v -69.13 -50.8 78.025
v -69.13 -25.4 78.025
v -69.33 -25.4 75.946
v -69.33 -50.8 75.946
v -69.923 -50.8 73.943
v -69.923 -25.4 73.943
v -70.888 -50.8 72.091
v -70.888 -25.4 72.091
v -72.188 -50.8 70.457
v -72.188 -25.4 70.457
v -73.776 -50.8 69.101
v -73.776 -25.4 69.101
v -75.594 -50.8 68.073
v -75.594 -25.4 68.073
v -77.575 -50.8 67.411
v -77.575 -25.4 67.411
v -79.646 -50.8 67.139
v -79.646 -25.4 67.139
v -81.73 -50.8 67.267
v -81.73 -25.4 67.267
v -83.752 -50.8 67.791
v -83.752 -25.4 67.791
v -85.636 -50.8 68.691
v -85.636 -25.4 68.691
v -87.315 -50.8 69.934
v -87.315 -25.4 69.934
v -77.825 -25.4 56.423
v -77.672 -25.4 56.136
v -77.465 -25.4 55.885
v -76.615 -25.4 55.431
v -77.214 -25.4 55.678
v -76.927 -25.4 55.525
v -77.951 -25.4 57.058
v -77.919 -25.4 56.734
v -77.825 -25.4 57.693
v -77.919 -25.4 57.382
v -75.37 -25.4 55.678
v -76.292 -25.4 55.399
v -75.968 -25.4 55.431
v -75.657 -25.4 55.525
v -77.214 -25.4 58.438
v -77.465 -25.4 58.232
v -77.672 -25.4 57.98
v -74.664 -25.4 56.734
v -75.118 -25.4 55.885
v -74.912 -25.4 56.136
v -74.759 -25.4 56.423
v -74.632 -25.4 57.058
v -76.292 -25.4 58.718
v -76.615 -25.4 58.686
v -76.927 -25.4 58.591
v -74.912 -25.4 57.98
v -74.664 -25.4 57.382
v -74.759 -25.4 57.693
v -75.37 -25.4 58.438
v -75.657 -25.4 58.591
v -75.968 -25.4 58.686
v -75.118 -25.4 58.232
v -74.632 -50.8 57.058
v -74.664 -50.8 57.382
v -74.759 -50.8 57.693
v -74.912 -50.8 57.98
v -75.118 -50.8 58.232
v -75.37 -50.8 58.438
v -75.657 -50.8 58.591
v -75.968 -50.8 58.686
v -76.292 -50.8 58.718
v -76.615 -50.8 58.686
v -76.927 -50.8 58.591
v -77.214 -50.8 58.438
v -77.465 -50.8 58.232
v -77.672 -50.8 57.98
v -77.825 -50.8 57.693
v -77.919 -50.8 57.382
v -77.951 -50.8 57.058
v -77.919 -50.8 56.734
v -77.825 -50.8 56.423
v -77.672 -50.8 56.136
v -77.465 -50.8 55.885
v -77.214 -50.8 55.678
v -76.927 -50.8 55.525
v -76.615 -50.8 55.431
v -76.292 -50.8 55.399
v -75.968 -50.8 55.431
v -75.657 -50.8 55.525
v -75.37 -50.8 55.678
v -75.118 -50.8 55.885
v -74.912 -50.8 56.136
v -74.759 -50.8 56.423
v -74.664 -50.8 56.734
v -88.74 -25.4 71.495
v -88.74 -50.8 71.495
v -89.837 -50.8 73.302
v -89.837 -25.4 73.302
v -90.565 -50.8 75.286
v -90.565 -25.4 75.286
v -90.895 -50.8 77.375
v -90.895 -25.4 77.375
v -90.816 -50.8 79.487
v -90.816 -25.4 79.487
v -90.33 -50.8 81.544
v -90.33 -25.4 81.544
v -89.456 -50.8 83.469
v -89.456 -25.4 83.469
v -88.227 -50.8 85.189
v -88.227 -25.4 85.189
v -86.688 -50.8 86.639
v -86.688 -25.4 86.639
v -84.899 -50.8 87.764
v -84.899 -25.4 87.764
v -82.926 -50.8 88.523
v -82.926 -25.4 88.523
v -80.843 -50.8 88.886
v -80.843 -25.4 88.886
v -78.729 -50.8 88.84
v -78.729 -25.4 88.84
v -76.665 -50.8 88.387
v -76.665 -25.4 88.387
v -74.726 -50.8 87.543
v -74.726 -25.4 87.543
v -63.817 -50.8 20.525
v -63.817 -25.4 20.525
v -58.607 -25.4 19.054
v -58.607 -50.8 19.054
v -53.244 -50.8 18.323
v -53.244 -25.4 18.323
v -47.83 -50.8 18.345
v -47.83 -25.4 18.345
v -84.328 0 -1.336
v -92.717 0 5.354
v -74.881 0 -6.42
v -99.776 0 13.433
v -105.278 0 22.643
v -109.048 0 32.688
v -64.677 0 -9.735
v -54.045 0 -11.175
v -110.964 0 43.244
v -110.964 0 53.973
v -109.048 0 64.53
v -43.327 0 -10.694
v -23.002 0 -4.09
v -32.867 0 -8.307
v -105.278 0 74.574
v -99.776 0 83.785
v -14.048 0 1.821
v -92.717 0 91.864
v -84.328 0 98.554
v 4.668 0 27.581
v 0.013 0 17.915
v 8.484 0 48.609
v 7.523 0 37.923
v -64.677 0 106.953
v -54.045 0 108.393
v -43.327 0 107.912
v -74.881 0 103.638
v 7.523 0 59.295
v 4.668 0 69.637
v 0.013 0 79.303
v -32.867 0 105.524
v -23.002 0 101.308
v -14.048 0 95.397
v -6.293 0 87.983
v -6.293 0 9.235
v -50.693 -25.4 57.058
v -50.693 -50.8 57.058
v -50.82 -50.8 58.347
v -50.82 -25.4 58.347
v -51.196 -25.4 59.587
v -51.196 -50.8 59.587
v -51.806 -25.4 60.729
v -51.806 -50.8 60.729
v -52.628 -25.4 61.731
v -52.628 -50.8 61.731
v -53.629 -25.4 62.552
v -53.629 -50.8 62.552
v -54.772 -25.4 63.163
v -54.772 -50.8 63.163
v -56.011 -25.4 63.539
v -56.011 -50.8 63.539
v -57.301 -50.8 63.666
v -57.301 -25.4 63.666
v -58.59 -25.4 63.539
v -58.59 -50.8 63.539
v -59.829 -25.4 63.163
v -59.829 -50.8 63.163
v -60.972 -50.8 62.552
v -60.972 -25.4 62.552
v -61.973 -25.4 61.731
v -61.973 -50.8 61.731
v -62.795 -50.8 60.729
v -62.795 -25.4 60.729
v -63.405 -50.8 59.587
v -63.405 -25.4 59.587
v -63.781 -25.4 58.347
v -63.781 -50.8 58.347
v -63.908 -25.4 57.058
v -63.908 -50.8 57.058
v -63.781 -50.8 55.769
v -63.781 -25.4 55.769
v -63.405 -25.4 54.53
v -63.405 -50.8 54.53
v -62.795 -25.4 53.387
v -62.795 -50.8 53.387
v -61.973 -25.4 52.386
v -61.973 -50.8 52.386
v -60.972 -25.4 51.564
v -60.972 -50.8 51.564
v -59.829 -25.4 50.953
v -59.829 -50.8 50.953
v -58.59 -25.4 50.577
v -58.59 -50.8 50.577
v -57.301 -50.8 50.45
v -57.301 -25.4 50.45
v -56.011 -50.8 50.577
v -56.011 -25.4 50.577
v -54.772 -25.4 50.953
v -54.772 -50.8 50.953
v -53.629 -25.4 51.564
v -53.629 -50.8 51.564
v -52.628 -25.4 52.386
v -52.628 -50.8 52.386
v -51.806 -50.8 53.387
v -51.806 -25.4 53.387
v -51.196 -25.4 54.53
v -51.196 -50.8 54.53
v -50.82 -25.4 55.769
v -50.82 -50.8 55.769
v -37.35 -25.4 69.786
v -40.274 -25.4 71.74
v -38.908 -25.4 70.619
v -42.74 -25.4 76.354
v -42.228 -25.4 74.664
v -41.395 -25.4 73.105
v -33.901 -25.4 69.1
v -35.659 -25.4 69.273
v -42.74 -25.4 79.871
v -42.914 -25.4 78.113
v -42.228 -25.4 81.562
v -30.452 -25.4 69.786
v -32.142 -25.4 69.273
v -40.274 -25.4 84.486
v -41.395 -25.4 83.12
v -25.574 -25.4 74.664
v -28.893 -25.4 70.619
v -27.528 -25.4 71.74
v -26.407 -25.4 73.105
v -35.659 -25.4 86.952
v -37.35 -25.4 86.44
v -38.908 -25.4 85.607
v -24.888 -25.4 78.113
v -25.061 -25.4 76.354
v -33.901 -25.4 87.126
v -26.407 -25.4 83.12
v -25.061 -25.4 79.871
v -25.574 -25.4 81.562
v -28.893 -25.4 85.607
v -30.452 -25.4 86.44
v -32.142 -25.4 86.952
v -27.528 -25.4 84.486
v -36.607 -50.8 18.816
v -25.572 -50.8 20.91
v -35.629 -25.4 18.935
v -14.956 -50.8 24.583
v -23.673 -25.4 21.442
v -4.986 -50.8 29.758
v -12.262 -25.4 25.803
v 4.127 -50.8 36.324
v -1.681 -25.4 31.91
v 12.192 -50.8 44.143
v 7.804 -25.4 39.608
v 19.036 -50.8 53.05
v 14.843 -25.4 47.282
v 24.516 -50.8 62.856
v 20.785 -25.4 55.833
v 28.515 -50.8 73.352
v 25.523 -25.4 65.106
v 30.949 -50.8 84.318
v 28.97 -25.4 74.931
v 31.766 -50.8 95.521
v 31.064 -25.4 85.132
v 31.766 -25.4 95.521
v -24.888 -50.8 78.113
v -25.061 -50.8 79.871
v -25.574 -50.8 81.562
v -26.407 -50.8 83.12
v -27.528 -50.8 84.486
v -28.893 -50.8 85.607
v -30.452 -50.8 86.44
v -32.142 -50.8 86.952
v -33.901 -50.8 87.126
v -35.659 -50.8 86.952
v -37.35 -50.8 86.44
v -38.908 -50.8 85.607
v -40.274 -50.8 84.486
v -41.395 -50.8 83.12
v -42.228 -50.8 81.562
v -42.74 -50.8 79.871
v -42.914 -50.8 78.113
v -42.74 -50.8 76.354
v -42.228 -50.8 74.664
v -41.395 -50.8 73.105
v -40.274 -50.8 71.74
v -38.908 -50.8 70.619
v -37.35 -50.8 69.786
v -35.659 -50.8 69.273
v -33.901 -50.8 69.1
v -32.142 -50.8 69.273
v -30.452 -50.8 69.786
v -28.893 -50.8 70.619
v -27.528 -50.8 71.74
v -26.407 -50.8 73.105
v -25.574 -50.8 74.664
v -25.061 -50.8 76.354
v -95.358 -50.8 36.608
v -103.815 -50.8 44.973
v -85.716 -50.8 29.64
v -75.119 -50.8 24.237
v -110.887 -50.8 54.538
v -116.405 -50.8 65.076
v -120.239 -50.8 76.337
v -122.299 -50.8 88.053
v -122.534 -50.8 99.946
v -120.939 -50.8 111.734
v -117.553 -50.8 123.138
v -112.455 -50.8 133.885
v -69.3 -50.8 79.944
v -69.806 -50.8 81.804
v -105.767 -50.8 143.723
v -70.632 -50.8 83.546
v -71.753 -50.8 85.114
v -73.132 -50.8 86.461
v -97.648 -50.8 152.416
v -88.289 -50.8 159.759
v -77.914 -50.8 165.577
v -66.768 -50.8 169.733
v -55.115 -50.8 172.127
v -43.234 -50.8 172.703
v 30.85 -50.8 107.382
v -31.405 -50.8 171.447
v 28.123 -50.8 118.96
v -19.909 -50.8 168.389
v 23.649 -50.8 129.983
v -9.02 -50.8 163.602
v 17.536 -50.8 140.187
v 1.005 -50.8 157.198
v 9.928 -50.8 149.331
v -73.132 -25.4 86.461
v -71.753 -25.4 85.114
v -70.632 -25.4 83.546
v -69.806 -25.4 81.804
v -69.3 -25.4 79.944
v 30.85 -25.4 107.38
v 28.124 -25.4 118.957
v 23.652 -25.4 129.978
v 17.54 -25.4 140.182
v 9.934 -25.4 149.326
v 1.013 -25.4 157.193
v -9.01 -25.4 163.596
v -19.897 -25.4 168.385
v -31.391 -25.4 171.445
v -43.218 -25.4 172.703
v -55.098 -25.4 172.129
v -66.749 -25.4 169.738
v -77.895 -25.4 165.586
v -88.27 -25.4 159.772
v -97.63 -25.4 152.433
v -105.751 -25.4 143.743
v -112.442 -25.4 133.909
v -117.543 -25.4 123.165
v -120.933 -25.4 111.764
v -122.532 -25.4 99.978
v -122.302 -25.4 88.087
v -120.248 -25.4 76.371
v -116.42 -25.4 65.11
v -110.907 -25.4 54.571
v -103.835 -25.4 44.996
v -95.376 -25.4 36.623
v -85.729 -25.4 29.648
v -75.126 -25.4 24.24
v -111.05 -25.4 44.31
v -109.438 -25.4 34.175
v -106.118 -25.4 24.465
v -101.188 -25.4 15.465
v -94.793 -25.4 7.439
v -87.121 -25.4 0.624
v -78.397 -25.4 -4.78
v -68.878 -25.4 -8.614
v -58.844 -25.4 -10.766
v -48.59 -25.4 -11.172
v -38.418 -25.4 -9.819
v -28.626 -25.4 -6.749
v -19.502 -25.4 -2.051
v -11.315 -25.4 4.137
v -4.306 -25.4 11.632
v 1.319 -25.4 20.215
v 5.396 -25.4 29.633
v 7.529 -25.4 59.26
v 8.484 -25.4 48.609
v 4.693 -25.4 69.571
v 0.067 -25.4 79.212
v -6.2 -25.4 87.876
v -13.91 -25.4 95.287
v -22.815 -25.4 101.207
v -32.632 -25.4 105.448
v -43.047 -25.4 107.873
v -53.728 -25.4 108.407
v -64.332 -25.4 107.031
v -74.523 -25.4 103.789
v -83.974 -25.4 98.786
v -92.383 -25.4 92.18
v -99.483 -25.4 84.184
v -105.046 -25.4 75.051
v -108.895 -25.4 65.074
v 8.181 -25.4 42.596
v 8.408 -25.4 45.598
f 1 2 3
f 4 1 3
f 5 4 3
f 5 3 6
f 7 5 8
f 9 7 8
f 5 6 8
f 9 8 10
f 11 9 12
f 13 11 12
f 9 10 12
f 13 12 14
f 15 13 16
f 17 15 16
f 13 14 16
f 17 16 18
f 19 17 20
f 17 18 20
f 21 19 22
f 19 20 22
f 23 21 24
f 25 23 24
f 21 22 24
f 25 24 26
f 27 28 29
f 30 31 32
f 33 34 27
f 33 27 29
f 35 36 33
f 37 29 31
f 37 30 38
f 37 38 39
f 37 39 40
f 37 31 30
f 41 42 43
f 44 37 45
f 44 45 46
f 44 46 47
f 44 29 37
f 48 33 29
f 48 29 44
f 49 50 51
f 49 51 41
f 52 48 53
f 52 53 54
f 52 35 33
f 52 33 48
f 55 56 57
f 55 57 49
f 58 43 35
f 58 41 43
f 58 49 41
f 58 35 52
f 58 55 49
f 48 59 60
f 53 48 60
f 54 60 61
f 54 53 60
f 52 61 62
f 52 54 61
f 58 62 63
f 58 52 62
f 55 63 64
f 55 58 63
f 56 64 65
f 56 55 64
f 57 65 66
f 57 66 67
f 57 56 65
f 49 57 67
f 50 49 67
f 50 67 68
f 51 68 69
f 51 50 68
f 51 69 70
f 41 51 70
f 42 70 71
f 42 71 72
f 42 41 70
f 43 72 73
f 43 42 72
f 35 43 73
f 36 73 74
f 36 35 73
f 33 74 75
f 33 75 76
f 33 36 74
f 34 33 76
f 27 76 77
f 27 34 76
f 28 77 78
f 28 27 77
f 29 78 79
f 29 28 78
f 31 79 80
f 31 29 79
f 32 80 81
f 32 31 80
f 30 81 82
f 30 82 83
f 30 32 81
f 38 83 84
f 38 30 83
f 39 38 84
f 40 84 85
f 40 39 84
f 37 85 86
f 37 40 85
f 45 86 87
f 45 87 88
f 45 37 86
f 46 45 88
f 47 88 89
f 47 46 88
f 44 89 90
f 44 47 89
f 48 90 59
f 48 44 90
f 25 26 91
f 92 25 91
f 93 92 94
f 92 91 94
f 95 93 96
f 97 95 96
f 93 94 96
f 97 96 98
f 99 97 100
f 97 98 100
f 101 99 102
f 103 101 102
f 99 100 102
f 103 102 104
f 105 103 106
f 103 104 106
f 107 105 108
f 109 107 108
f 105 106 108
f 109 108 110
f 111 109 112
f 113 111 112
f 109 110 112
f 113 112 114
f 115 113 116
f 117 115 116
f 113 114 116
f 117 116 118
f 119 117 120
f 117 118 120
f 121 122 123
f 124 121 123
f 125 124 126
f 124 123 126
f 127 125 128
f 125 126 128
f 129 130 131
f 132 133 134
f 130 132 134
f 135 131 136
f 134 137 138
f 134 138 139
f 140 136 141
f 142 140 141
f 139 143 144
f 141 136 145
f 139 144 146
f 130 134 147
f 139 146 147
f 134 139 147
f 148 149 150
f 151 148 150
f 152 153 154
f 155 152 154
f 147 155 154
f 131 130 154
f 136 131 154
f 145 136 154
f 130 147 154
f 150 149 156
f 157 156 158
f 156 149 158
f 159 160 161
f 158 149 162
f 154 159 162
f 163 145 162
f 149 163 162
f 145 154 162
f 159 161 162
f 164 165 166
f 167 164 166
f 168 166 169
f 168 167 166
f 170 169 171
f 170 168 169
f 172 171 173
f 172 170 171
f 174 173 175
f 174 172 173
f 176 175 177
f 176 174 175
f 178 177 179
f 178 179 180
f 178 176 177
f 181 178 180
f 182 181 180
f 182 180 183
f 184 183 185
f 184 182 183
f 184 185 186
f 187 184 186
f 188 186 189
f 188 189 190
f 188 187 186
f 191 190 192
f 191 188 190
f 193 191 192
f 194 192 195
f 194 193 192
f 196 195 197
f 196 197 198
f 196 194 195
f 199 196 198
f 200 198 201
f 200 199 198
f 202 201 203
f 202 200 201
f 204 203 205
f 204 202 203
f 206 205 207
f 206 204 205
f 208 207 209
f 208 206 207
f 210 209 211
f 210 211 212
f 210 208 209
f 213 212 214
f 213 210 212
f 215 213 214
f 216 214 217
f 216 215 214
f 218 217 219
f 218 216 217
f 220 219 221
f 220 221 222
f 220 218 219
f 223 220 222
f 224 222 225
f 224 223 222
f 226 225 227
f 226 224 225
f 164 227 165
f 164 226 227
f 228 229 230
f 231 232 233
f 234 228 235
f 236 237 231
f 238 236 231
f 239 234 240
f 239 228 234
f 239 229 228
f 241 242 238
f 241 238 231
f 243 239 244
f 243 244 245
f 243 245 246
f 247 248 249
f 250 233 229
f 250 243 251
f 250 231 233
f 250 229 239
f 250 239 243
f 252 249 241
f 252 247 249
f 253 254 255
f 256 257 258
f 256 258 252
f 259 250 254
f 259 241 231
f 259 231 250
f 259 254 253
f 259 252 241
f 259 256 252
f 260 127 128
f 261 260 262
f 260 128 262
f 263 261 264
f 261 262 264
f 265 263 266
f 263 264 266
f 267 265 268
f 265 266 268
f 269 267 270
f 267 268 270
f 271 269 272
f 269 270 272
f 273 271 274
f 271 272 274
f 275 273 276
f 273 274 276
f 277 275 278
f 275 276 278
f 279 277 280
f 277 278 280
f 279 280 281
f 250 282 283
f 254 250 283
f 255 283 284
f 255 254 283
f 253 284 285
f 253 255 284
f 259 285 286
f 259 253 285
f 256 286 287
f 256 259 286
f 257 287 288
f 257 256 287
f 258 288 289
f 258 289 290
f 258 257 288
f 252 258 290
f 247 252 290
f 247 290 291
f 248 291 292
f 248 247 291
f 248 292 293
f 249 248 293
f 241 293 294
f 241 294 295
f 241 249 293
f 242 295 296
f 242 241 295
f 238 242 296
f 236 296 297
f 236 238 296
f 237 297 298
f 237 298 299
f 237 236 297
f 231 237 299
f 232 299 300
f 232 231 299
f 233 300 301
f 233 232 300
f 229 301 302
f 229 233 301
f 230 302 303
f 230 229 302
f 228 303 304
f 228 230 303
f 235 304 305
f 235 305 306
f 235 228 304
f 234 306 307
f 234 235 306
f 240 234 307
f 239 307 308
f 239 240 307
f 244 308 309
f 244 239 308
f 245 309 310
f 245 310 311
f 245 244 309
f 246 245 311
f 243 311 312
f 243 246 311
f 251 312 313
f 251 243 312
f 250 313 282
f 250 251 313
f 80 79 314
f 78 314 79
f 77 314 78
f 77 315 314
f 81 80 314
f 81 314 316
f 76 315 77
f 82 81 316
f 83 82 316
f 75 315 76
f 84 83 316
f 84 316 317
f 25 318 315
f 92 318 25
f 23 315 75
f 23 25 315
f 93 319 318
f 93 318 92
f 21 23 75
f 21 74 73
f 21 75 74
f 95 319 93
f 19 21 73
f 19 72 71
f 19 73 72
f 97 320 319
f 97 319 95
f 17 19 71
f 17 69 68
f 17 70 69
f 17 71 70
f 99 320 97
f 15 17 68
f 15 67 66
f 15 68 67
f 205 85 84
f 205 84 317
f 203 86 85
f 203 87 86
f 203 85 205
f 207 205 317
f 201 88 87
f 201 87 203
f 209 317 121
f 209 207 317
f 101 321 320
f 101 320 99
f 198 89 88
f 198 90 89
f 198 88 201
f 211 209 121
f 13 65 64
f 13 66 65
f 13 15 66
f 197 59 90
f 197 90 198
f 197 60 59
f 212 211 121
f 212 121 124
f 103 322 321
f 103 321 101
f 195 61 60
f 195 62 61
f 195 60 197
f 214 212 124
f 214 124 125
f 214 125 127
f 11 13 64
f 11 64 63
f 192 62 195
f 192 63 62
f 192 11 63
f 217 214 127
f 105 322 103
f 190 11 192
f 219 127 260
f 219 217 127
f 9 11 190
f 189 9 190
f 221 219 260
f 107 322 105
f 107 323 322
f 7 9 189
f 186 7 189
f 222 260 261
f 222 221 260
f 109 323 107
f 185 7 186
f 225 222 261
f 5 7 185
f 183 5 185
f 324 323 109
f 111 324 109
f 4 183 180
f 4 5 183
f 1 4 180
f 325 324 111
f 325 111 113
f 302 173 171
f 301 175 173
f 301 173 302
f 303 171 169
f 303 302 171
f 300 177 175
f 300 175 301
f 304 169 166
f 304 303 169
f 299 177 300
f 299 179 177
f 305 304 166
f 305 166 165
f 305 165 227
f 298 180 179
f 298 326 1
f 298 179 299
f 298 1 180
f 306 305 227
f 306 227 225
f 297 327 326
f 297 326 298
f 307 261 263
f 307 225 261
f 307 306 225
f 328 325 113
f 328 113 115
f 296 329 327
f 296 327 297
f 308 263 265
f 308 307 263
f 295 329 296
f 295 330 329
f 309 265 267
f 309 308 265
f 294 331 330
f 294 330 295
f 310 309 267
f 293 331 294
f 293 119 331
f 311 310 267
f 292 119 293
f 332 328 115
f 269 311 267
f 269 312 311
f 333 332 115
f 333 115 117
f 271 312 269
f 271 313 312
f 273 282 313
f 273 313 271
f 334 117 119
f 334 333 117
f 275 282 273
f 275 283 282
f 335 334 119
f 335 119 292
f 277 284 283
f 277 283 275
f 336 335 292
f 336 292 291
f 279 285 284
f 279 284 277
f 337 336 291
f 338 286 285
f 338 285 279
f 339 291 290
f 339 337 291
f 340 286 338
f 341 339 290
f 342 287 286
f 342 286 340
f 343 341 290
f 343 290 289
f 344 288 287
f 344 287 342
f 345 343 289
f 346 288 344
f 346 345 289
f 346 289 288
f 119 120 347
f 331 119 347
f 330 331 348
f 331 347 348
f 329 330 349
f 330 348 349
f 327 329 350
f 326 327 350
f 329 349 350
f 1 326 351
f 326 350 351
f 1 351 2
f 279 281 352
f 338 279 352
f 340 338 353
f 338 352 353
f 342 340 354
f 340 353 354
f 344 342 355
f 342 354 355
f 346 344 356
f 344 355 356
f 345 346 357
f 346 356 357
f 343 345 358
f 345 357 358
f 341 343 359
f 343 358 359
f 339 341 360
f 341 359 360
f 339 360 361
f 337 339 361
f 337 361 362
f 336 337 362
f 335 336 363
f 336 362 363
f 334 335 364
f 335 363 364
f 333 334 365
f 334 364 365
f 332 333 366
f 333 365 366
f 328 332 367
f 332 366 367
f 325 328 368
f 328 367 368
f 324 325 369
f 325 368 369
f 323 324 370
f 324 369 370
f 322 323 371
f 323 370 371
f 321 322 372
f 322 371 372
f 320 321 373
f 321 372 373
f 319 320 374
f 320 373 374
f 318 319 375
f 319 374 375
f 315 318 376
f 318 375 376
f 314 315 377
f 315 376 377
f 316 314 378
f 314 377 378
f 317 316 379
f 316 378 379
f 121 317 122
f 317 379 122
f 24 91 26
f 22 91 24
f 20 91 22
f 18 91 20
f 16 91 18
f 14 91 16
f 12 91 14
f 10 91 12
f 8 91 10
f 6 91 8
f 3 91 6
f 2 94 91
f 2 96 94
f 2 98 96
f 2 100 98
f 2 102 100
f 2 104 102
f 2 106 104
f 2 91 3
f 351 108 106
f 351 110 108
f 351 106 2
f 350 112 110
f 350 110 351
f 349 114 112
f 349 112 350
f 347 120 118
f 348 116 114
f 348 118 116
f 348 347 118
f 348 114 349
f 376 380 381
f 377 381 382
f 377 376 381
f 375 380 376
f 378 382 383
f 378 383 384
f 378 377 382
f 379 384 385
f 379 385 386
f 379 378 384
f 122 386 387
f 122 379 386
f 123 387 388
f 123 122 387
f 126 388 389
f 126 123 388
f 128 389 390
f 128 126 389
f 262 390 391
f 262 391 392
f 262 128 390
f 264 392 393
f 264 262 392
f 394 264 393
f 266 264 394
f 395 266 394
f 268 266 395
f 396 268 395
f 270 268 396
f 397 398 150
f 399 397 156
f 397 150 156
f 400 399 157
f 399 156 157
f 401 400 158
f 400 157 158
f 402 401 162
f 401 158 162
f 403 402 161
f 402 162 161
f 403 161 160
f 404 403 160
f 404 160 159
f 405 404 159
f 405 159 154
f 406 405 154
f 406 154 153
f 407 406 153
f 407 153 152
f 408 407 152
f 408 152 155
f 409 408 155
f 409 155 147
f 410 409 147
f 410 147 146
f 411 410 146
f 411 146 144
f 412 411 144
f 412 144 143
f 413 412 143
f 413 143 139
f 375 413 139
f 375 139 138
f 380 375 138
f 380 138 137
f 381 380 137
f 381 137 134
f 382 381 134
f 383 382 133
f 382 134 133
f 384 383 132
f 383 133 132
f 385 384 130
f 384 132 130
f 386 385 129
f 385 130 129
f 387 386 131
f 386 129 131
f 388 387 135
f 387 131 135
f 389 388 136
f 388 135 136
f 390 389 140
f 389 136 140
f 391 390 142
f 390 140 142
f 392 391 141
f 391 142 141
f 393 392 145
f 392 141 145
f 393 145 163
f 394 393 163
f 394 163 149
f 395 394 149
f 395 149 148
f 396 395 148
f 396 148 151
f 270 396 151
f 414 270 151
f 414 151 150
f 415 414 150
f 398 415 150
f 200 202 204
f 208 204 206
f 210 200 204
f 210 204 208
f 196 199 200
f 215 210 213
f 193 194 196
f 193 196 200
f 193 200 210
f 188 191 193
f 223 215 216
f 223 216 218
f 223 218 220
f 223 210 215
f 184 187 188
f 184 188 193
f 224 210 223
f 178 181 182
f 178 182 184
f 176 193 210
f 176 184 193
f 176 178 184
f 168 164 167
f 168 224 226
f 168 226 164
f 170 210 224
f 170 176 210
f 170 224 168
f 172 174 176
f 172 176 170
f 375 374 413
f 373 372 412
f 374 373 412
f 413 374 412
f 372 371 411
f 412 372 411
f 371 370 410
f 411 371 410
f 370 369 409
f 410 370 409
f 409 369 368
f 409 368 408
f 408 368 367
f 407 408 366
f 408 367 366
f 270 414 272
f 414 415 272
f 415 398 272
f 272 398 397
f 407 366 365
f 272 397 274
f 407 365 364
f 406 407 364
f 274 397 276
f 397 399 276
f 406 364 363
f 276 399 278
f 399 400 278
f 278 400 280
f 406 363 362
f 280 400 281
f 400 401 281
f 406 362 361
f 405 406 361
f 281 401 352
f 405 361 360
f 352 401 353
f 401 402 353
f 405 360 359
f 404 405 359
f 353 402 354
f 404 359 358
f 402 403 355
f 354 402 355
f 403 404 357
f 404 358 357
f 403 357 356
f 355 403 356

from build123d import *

# Parameters (mm, degrees)
F0_R     = 59.8445328198
F1_DEPTH = 25.4
F2_R     = 1.6595219512
F2_R_2   = 6.6078081375
F2_R_3   = 9.0128381588
F3_DEPTH = 25.4


with BuildPart() as f1:
    # F0 (on Front) → F1 (new body)
    with BuildSketch(Plane.XZ):
        with Locations((-51.3602979481, 48.6088730395)):
            Circle(F0_R)
    extrude(amount=F1_DEPTH)

    # F2 (on face) → F3 (join)
    with BuildSketch(Plane.XZ.offset(25.4)):
        with BuildLine():
            ThreePointArc((-74.7262415408, 87.5429960215), (-70.6324871698, 83.5455246385), (-69.1296755989, 78.0246406794))
            ThreePointArc((-69.1296755989, 78.0246406794), (-75.594202636, 68.0728078801), (-87.3145593395, 69.9335401611))
            ThreePointArc((-87.3145593395, 69.9335401611), (-85.74951144, 40.3862521604), (-63.8172999639, 20.5249907984))
            ThreePointArc((-63.8172999639, 20.5249907984), (-55.8809359492, 19.0161078752), (-47.8303578802, 18.3446957784))
            ThreePointArc((-47.8303578802, 18.3446957784), (-22.2494316739, 30.6402887159), (-11.8735676311, 57.0582151413))
            ThreePointArc((-11.8735676311, 57.0582151413), (-33.7521367496, 91.9859279311), (-74.7262415408, 87.5429960215))
        make_face()
        with Locations((-76.2917250395, 57.0582151413)):
            Circle(F2_R, mode=Mode.SUBTRACT)
        with Locations((-57.3005713522, 57.0582151413)):
            Circle(F2_R_2, mode=Mode.SUBTRACT)
        with Locations((-33.9007563889, 78.1127512455)):
            Circle(F2_R_3, mode=Mode.SUBTRACT)
        with BuildLine():
            ThreePointArc((-87.3145593395, 69.9335401611), (-88.8832654664, 84.3591256886), (-74.7262415408, 87.5429960215))
            ThreePointArc((-74.7262415408, 87.5429960215), (-33.7521367496, 91.9859279311), (-11.8735676311, 57.0582151413))
            ThreePointArc((-11.8735676311, 57.0582151413), (-22.2494316739, 30.6402887159), (-47.8303578802, 18.3446957784))
            ThreePointArc((-47.8303578802, 18.3446957784), (8.3017992463, 40.0870242253), (31.7662845989, 95.5213622938))
            ThreePointArc((31.7662845989, 95.5213622938), (-93.1100278653, 156.2681263545), (-63.8172999639, 20.5249907984))
            ThreePointArc((-63.8172999639, 20.5249907984), (-85.74951144, 40.3862521604), (-87.3145593395, 69.9335401611))
        make_face()
        with BuildLine():
            ThreePointArc((-47.8303578802, 18.3446957784), (-55.8809359492, 19.0161078752), (-63.8172999639, 20.5249907984))
            ThreePointArc((-63.8172999639, 20.5249907984), (-55.9383572599, 18.5950679887), (-47.8303578802, 18.3446957784))
        make_face()
    extrude(amount=F3_DEPTH)


solid = f1.part
